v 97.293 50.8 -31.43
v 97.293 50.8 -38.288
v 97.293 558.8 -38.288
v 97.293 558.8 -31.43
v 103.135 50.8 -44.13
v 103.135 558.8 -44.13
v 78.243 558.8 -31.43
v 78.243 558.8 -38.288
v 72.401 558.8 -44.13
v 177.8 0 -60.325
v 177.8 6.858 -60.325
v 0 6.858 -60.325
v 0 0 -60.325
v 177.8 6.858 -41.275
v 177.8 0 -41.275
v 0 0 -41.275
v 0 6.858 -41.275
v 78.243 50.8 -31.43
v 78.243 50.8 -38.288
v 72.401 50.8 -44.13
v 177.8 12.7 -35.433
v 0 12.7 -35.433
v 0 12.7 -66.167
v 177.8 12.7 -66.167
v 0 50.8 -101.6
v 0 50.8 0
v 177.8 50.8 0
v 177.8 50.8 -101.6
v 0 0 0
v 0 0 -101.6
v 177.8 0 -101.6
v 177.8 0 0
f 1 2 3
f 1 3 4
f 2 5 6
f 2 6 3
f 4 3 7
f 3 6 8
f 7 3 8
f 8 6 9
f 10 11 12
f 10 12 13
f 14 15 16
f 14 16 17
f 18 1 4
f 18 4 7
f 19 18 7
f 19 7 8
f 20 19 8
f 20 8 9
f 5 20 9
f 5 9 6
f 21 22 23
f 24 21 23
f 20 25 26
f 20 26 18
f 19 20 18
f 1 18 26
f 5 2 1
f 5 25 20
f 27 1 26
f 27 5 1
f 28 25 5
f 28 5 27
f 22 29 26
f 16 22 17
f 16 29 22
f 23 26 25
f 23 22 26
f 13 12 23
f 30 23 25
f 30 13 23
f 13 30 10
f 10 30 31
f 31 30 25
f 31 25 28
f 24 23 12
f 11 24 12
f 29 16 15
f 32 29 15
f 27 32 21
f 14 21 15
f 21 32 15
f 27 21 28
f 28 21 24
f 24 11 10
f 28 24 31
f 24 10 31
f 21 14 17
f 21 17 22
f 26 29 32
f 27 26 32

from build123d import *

# Parameters (mm, degrees)
SKETCH1_W           = 177.8
SKETCH1_H           = 101.6
BOSS_EXTRUDE1_DEPTH = 50.8
CUT_EXTRUDE1_DEPTH  = 178.8
BOSS_EXTRUDE2_DEPTH = 508


with BuildPart() as part:
    # Sketch1 → Boss-Extrude1 (new body)
    with BuildSketch(Plane(origin=(0, 0, 0), x_dir=(1, 0, 0), z_dir=(0, 1, 0))):
        with Locations((88.9, 50.8)):
            Rectangle(SKETCH1_W, SKETCH1_H)
    extrude(amount=BOSS_EXTRUDE1_DEPTH)

    # Sketch2 → Cut-Extrude1 (cut, through all)
    with BuildSketch(Plane(origin=(177.8, 0, 0), x_dir=(0, 0, -1), z_dir=(1, 0, 0))):
        Polygon((41.275, 0), (41.275, 6.858), (35.433, 12.7), (66.167, 12.7), (60.325, 6.858), (60.325, 0), align=None)
    extrude(amount=-CUT_EXTRUDE1_DEPTH, mode=Mode.SUBTRACT)

    # Sketch3 → Boss-Extrude2 (add)
    with BuildSketch(Plane(origin=(0, 50.8, 0), x_dir=(1, 0, 0), z_dir=(0, 1, 0))):
        Polygon((78.242626062, 31.429656714), (78.242626062, 38.287656714), (72.400626062, 44.129656714), (103.134626062, 44.129656714), (97.292626062, 38.287656714), (97.292626062, 31.429656714), align=None)
    extrude(amount=BOSS_EXTRUDE2_DEPTH)


solid = part.part
